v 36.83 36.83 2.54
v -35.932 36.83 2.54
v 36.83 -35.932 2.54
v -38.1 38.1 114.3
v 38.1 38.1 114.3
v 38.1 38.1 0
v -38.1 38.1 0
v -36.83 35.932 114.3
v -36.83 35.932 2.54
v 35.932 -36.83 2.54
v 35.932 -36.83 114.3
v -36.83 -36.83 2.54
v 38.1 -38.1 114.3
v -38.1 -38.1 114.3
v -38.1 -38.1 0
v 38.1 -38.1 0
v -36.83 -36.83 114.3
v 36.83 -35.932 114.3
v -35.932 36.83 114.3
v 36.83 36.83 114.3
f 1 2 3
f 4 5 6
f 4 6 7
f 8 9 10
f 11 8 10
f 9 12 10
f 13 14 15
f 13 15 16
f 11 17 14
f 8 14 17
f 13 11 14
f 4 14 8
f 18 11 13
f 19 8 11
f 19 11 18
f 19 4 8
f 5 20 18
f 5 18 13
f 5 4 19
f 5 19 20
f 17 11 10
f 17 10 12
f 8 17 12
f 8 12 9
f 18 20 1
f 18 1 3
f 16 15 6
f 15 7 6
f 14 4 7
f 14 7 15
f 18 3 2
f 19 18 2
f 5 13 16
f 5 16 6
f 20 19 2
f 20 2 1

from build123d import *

# Parameters (mm, degrees)
F1_DEPTH = 2.54
F2_DEPTH = 114.3


with BuildPart() as f1:
    # F0 (on Top) → F1 (new body)
    with BuildSketch(Plane.XY):
        Polygon((35.9319743879, -36.83), (-36.83, 35.9319743879), (-36.83, -36.83), align=None)
    extrude(amount=F1_DEPTH)



with BuildPart() as f1b:
    # F0 (on Top) → F1, piece 2 (new body)
    with BuildSketch(Plane.XY):
        Polygon((36.83, 36.83), (-35.9319743879, 36.83), (36.83, -35.9319743879), align=None)
    extrude(amount=F1_DEPTH)


with BuildPart() as f1_1:
    add(f1.part)

    add(f1b.part)  # F2 merges F1b
    # F0 (on Top) → F2 (join)
    with BuildSketch(Plane.XY):
        with BuildLine():
            Line((-37.465, 38.1), (-38.1, 38.1))
            Line((-38.1, 38.1), (-38.1, 37.465))
            ThreePointArc((-38.1, 37.465), (-37.6509871939, 37.6509871939), (-37.465, 38.1))
        make_face()
        with BuildLine():
            Line((-37.2019743879, 38.1), (-37.465, 38.1))
            ThreePointArc((-37.465, 38.1), (-37.6509871939, 37.6509871939), (-38.1, 37.465))
            Line((-38.1, 37.465), (-38.1, 37.2019743879))
            Line((-38.1, 37.2019743879), (-36.83, 35.9319743879))
            Line((-36.83, 35.9319743879), (-36.83, 36.83))
            Line((-36.83, 36.83), (-35.9319743879, 36.83))
            Line((-35.9319743879, 36.83), (-37.2019743879, 38.1))
        make_face()
        Polygon((-36.83, 35.9319743879), (-38.1, 37.2019743879), (-38.1, -38.1), (37.2019743879, -38.1), (35.9319743879, -36.83), (-36.83, -36.83), align=None)
        Polygon((36.83, -35.9319743879), (-35.9319743879, 36.83), (-36.83, 36.83), (-36.83, 35.9319743879), (35.9319743879, -36.83), (36.83, -36.83), align=None)
        Polygon((38.1, 38.1), (-37.2019743879, 38.1), (-35.9319743879, 36.83), (36.83, 36.83), (36.83, -35.9319743879), (38.1, -37.2019743879), align=None)
        with BuildLine():
            Line((38.1, -37.465), (38.1, -37.2019743879))
            Line((38.1, -37.2019743879), (36.83, -35.9319743879))
            Line((36.83, -35.9319743879), (36.83, -36.83))
            Line((36.83, -36.83), (35.9319743879, -36.83))
            Line((35.9319743879, -36.83), (37.2019743879, -38.1))
            Line((37.2019743879, -38.1), (37.465, -38.1))
            ThreePointArc((37.465, -38.1), (37.6509871939, -37.6509871939), (38.1, -37.465))
        make_face()
        with BuildLine():
            Line((38.1, -38.1), (38.1, -37.465))
            ThreePointArc((38.1, -37.465), (37.6509871939, -37.6509871939), (37.465, -38.1))
            Line((37.465, -38.1), (38.1, -38.1))
        make_face()
    extrude(amount=F2_DEPTH)


solid = f1_1.part
